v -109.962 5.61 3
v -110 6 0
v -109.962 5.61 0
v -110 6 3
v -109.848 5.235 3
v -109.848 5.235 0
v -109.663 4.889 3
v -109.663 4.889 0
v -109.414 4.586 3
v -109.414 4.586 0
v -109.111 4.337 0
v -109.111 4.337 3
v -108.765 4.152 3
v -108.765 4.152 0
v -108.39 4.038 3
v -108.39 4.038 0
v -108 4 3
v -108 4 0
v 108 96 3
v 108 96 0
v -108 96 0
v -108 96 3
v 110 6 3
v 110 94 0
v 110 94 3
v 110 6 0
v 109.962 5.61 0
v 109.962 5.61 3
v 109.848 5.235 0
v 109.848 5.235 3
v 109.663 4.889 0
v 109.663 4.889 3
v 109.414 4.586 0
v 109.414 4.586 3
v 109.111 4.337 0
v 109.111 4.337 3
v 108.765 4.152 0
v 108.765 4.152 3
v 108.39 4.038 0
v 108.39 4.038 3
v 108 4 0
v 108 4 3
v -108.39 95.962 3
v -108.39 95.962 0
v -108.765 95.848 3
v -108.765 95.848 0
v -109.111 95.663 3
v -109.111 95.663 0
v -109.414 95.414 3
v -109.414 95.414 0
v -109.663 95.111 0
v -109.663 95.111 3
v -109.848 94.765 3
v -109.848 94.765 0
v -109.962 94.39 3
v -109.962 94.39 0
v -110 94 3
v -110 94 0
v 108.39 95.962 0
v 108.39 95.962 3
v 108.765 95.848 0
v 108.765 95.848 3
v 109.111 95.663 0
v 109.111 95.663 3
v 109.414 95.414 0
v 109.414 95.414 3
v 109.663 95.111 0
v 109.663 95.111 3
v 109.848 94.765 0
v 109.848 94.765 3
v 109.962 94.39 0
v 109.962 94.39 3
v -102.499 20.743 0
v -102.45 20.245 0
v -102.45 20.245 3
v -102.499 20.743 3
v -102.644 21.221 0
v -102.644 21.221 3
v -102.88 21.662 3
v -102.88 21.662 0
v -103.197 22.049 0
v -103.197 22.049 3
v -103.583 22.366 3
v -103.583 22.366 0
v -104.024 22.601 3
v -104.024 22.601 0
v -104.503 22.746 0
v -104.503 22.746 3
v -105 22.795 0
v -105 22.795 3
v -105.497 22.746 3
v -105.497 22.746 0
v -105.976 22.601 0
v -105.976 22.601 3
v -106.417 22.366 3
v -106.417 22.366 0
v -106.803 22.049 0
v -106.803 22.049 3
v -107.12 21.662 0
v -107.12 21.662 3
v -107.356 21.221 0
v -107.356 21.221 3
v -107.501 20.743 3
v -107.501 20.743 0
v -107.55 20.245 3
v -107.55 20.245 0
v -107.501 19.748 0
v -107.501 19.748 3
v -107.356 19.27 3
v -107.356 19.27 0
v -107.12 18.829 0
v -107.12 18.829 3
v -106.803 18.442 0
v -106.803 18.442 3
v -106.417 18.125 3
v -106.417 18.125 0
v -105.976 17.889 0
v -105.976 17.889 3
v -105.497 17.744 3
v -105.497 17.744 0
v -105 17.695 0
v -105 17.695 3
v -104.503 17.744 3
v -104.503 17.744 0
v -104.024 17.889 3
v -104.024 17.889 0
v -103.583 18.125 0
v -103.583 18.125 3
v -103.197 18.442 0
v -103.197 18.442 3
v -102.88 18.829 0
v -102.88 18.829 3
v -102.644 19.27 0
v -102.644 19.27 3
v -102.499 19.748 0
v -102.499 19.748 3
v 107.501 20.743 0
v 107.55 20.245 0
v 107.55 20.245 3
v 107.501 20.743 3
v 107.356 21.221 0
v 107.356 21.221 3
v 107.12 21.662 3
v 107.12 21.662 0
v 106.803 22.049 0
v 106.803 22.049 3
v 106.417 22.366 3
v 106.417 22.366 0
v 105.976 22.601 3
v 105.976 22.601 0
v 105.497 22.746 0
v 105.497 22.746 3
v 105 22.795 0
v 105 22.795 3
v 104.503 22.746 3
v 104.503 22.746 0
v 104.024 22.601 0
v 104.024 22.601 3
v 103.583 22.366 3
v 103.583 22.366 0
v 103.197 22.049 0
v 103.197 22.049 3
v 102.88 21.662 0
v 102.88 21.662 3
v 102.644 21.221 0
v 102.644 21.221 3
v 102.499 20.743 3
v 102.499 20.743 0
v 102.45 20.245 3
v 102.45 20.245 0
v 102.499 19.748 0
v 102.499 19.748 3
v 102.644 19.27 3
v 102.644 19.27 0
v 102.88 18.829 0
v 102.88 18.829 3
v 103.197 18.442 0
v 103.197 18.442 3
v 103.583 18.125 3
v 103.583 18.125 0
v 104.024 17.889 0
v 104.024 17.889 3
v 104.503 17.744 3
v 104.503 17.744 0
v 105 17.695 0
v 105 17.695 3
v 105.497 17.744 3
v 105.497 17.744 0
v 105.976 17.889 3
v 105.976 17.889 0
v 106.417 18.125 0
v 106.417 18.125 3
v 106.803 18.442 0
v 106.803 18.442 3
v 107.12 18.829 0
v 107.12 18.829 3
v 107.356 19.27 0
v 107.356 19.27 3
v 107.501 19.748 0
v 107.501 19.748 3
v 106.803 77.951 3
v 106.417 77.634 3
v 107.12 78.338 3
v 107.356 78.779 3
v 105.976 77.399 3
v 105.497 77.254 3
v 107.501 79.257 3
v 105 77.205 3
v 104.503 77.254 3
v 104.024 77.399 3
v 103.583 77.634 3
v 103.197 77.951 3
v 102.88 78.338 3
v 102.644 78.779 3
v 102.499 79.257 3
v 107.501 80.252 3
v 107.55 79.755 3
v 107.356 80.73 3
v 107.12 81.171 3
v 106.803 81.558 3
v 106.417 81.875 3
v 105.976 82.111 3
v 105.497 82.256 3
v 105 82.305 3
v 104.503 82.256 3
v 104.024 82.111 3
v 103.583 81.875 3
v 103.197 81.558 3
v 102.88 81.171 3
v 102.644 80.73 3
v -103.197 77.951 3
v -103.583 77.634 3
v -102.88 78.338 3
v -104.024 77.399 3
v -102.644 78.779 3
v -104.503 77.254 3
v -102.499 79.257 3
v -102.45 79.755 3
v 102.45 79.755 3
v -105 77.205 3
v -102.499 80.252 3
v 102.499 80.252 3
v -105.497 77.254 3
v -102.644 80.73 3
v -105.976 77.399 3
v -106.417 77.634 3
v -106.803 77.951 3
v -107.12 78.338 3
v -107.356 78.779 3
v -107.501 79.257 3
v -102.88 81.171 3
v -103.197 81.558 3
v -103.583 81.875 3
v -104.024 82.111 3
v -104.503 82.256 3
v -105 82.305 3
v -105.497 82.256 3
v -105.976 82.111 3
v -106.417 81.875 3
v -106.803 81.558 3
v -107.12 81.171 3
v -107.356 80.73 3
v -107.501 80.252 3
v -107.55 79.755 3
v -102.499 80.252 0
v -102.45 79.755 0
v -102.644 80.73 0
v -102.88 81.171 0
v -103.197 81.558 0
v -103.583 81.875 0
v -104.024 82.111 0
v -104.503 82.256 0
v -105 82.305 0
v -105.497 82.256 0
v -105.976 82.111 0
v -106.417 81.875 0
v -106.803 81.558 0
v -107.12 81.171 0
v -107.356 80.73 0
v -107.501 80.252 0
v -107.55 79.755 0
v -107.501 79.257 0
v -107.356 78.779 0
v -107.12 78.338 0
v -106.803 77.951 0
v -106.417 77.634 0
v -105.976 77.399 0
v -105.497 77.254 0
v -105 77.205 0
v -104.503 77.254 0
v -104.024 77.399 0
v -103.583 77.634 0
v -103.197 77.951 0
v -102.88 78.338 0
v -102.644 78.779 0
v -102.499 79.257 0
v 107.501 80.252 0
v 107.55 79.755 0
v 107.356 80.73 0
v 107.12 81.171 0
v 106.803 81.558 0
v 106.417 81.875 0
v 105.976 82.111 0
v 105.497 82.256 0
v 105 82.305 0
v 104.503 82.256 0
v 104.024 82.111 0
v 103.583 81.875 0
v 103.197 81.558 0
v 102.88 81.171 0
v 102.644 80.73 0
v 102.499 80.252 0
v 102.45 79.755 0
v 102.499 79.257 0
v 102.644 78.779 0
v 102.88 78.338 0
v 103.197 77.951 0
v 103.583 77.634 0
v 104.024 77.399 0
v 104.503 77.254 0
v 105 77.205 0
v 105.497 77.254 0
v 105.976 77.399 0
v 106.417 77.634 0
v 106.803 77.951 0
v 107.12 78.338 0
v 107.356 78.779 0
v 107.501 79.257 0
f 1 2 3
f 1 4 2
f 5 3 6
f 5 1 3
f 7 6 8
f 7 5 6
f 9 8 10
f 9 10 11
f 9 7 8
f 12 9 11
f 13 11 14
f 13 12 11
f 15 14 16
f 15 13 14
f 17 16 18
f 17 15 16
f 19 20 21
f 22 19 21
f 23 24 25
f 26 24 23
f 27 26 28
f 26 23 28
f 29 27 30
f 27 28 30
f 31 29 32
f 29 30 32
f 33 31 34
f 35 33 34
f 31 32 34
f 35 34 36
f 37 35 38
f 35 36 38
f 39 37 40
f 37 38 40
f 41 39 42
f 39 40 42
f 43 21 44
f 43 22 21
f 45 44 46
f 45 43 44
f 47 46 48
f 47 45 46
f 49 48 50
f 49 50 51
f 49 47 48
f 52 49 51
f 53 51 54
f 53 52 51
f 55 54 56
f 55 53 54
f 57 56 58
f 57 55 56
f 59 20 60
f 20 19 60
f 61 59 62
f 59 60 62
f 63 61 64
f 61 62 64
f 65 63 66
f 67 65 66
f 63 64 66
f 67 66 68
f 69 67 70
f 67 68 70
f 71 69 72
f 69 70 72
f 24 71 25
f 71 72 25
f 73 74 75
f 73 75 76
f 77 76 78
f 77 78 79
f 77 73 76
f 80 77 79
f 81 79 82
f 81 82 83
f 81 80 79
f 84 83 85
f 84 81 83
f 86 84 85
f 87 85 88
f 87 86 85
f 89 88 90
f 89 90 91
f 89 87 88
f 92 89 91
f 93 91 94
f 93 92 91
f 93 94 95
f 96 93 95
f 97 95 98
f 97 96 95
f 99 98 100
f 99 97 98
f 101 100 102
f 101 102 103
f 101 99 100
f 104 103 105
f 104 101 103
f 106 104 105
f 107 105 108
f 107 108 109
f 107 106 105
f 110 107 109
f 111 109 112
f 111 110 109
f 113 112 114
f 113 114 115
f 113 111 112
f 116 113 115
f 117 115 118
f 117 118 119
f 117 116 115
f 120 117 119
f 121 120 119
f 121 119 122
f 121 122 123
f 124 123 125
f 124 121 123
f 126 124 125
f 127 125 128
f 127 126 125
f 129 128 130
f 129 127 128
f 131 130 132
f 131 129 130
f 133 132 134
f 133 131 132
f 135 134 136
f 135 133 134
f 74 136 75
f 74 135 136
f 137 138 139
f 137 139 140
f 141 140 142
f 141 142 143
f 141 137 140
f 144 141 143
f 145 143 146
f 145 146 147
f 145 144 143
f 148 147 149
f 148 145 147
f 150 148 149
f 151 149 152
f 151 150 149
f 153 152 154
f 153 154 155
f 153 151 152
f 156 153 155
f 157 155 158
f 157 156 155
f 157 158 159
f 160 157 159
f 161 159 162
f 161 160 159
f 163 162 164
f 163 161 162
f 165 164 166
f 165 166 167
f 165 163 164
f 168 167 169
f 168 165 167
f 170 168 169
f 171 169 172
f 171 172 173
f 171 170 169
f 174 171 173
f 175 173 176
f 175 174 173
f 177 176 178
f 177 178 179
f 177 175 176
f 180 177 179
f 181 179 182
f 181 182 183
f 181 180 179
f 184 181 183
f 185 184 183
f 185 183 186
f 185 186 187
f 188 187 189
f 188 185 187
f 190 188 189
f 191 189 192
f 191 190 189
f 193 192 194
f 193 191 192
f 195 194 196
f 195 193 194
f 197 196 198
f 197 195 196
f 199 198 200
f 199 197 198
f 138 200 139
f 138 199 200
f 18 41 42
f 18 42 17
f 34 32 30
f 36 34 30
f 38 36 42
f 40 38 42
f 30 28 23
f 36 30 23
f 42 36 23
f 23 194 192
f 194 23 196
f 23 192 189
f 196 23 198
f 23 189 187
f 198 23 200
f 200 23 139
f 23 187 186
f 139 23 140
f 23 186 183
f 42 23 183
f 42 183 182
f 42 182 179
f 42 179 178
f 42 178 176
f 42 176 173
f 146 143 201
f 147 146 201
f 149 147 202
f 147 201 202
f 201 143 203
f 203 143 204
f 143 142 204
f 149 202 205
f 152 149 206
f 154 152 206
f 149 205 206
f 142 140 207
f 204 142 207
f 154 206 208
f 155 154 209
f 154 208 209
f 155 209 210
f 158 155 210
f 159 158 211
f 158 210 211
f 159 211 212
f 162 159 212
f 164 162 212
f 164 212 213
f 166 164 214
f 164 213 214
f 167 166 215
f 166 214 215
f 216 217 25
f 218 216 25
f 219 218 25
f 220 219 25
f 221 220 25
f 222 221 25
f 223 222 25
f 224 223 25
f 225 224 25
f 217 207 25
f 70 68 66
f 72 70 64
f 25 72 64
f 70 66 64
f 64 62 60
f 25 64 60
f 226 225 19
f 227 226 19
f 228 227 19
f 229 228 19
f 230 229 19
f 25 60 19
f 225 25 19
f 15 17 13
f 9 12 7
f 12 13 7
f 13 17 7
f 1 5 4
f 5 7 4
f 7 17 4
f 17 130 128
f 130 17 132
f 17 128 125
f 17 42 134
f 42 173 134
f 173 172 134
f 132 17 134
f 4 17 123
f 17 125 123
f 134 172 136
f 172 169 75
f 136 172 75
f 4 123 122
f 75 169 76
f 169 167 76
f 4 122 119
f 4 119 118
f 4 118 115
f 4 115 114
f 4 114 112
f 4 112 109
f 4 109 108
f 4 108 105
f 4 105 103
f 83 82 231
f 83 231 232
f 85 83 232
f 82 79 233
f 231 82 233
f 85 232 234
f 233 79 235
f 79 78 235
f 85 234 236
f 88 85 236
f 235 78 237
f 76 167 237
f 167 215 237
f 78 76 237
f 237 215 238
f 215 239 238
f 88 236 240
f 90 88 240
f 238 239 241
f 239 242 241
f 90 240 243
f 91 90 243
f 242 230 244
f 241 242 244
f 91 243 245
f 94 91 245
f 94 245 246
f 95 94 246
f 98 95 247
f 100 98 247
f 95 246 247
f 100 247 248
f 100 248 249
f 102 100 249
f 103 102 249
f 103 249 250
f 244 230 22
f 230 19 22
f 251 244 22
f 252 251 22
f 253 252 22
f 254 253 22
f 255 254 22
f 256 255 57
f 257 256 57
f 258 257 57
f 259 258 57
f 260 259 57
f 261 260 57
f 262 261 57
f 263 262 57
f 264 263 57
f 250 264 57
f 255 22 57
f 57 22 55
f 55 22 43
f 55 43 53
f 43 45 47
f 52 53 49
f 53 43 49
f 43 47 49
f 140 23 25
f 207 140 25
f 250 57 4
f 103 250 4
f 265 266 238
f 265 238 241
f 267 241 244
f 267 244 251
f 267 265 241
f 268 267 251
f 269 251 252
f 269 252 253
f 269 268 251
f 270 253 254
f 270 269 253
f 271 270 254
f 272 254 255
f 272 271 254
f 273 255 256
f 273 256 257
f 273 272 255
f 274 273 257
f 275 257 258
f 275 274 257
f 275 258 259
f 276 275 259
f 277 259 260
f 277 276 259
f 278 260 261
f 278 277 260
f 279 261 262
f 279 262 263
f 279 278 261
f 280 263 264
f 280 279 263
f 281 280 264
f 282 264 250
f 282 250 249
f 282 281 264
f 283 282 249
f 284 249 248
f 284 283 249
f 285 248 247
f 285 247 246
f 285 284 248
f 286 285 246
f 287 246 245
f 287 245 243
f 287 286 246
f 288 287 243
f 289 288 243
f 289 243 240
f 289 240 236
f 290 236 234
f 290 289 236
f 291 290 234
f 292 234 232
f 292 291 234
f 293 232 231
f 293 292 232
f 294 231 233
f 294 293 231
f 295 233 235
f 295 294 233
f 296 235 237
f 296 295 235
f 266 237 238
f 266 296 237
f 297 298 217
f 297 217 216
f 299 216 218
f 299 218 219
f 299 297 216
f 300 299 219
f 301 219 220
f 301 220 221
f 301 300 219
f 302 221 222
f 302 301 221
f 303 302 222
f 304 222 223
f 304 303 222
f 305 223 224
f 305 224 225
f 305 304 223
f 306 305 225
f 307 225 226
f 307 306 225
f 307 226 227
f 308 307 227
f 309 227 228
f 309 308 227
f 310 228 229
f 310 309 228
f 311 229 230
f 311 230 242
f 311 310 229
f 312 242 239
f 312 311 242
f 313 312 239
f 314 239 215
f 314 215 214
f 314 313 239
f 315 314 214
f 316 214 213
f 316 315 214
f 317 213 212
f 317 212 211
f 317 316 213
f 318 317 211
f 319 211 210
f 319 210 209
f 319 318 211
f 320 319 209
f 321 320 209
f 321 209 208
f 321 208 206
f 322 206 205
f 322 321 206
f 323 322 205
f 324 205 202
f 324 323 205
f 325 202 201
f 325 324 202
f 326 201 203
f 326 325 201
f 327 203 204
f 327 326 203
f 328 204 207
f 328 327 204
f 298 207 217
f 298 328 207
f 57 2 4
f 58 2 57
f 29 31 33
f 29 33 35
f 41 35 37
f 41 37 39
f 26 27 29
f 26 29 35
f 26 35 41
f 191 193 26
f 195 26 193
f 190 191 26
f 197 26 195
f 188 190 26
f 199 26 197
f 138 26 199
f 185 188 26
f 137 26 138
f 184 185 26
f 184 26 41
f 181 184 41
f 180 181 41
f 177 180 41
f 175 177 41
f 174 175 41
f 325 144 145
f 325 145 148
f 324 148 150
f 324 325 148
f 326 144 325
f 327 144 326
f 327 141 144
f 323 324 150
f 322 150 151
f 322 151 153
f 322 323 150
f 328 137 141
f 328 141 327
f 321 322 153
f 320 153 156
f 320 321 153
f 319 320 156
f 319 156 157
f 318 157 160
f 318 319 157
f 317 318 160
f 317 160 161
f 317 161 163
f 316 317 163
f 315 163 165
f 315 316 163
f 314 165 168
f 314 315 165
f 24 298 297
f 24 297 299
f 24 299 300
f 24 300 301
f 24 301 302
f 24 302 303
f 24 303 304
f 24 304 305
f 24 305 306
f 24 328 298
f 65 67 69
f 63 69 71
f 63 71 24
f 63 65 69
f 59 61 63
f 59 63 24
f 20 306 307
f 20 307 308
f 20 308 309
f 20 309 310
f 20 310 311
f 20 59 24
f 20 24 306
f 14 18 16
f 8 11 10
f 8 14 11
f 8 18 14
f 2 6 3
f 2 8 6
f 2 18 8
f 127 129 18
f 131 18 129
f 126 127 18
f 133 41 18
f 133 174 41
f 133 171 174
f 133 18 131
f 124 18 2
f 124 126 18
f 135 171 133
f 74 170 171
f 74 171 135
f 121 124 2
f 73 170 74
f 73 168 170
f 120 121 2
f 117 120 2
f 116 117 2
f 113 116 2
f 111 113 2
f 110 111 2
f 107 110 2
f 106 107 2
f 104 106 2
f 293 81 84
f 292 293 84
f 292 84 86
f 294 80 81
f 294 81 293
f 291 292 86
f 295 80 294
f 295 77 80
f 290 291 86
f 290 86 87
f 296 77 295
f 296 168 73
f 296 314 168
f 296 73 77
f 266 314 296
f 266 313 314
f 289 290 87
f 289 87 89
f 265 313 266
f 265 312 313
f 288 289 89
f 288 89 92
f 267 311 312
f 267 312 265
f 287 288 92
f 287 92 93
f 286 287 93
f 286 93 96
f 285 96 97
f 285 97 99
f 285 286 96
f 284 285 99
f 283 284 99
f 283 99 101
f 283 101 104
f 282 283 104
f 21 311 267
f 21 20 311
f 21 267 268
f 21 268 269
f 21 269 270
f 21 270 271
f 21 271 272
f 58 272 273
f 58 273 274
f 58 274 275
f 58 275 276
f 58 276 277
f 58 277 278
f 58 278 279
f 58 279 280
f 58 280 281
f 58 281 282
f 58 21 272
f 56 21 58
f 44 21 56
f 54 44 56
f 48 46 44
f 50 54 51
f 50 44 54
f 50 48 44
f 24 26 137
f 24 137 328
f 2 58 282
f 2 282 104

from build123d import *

# Parameters (mm, degrees)
SKETCH1_R           = 2.55
BOSS_EXTRUDE1_DEPTH = 3
FILLET1_R           = 2


with BuildPart() as part:
    # Sketch1 → Boss-Extrude1 (new body)
    with BuildSketch(Plane.XY):
        Polygon((-100, 96), (100, 96), (110, 96), (110, 4), (-110, 4), (-110, 96), align=None)
        with Locations((105, 20.245379956)):
            Circle(SKETCH1_R, mode=Mode.SUBTRACT)
        with Locations((105, 79.754620044)):
            Circle(SKETCH1_R, mode=Mode.SUBTRACT)
        with Locations((-105, 20.245379956)):
            Circle(SKETCH1_R, mode=Mode.SUBTRACT)
        with Locations((-105, 79.754620044)):
            Circle(SKETCH1_R, mode=Mode.SUBTRACT)
    extrude(amount=BOSS_EXTRUDE1_DEPTH)

    # Fillet1
    fillet1_edges = [part.edges().sort_by_distance(p)[0] for p in [
        (110, 4, 1.5),
        (-110, 4, 1.5),
        (-110, 96, 1.5),
        (110, 96, 1.5),
    ]]
    fillet(fillet1_edges, radius=FILLET1_R)


solid = part.part
